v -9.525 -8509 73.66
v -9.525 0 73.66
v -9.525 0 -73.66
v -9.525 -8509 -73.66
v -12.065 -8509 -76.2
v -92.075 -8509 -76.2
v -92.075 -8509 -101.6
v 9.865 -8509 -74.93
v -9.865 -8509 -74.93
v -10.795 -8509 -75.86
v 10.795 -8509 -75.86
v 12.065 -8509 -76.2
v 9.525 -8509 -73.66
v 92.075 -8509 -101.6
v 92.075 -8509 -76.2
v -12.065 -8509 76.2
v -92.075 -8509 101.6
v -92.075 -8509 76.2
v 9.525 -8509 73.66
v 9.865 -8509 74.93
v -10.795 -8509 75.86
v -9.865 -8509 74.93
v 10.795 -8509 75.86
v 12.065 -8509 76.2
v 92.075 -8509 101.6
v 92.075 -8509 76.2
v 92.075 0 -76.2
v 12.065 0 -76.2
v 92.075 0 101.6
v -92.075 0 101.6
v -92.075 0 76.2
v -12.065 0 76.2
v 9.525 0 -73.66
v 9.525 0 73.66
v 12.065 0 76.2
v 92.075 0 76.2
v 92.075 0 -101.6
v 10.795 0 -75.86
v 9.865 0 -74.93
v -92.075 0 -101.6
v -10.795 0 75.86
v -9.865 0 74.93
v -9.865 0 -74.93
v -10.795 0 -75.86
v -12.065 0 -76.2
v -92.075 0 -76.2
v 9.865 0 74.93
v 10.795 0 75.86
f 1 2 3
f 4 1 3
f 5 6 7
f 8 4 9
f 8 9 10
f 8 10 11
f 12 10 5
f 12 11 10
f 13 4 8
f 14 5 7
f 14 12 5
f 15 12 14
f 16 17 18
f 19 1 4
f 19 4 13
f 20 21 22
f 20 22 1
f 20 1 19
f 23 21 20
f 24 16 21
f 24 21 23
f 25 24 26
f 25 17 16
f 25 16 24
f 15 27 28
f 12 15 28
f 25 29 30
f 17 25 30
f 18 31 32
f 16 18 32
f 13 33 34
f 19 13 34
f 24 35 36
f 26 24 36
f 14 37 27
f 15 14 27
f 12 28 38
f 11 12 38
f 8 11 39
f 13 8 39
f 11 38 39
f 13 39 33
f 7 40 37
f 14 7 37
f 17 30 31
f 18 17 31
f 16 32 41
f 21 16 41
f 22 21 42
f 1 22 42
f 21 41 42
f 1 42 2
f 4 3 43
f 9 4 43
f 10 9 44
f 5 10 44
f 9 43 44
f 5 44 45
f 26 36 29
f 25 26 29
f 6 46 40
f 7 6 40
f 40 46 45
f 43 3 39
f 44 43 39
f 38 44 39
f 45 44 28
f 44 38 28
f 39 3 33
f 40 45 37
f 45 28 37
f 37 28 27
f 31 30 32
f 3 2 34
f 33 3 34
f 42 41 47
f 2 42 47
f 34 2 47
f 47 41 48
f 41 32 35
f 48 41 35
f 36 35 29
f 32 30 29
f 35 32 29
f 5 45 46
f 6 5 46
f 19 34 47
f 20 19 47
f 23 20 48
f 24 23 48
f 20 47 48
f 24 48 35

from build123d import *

# Parameters (mm, degrees)
F1_DEPTH = 8509


with BuildPart() as f1:
    # F0 (on Front) → F1 (new body)
    with BuildSketch(Plane.XZ):
        with BuildLine():
            Line((92.075, -101.6), (92.075, -76.2))
            Line((92.075, -76.2), (12.065, -76.2))
            ThreePointArc((12.065, -76.2), (10.268949, -75.456051), (9.525, -73.66))
            Line((9.525, -73.66), (9.525, 73.66))
            ThreePointArc((9.525, 73.66), (10.268949, 75.456051), (12.065, 76.2))
            Line((12.065, 76.2), (92.075, 76.2))
            Line((92.075, 76.2), (92.075, 101.6))
            Line((92.075, 101.6), (-92.075, 101.6))
            Line((-92.075, 101.6), (-92.075, 76.2))
            Line((-92.075, 76.2), (-12.065, 76.2))
            ThreePointArc((-12.065, 76.2), (-10.268949, 75.456051), (-9.525, 73.66))
            Line((-9.525, 73.66), (-9.525, -73.66))
            ThreePointArc((-9.525, -73.66), (-10.268949, -75.456051), (-12.065, -76.2))
            Line((-12.065, -76.2), (-92.075, -76.2))
            Line((-92.075, -76.2), (-92.075, -101.6))
            Line((-92.075, -101.6), (92.075, -101.6))
        make_face()
    extrude(amount=F1_DEPTH)


solid = f1.part
